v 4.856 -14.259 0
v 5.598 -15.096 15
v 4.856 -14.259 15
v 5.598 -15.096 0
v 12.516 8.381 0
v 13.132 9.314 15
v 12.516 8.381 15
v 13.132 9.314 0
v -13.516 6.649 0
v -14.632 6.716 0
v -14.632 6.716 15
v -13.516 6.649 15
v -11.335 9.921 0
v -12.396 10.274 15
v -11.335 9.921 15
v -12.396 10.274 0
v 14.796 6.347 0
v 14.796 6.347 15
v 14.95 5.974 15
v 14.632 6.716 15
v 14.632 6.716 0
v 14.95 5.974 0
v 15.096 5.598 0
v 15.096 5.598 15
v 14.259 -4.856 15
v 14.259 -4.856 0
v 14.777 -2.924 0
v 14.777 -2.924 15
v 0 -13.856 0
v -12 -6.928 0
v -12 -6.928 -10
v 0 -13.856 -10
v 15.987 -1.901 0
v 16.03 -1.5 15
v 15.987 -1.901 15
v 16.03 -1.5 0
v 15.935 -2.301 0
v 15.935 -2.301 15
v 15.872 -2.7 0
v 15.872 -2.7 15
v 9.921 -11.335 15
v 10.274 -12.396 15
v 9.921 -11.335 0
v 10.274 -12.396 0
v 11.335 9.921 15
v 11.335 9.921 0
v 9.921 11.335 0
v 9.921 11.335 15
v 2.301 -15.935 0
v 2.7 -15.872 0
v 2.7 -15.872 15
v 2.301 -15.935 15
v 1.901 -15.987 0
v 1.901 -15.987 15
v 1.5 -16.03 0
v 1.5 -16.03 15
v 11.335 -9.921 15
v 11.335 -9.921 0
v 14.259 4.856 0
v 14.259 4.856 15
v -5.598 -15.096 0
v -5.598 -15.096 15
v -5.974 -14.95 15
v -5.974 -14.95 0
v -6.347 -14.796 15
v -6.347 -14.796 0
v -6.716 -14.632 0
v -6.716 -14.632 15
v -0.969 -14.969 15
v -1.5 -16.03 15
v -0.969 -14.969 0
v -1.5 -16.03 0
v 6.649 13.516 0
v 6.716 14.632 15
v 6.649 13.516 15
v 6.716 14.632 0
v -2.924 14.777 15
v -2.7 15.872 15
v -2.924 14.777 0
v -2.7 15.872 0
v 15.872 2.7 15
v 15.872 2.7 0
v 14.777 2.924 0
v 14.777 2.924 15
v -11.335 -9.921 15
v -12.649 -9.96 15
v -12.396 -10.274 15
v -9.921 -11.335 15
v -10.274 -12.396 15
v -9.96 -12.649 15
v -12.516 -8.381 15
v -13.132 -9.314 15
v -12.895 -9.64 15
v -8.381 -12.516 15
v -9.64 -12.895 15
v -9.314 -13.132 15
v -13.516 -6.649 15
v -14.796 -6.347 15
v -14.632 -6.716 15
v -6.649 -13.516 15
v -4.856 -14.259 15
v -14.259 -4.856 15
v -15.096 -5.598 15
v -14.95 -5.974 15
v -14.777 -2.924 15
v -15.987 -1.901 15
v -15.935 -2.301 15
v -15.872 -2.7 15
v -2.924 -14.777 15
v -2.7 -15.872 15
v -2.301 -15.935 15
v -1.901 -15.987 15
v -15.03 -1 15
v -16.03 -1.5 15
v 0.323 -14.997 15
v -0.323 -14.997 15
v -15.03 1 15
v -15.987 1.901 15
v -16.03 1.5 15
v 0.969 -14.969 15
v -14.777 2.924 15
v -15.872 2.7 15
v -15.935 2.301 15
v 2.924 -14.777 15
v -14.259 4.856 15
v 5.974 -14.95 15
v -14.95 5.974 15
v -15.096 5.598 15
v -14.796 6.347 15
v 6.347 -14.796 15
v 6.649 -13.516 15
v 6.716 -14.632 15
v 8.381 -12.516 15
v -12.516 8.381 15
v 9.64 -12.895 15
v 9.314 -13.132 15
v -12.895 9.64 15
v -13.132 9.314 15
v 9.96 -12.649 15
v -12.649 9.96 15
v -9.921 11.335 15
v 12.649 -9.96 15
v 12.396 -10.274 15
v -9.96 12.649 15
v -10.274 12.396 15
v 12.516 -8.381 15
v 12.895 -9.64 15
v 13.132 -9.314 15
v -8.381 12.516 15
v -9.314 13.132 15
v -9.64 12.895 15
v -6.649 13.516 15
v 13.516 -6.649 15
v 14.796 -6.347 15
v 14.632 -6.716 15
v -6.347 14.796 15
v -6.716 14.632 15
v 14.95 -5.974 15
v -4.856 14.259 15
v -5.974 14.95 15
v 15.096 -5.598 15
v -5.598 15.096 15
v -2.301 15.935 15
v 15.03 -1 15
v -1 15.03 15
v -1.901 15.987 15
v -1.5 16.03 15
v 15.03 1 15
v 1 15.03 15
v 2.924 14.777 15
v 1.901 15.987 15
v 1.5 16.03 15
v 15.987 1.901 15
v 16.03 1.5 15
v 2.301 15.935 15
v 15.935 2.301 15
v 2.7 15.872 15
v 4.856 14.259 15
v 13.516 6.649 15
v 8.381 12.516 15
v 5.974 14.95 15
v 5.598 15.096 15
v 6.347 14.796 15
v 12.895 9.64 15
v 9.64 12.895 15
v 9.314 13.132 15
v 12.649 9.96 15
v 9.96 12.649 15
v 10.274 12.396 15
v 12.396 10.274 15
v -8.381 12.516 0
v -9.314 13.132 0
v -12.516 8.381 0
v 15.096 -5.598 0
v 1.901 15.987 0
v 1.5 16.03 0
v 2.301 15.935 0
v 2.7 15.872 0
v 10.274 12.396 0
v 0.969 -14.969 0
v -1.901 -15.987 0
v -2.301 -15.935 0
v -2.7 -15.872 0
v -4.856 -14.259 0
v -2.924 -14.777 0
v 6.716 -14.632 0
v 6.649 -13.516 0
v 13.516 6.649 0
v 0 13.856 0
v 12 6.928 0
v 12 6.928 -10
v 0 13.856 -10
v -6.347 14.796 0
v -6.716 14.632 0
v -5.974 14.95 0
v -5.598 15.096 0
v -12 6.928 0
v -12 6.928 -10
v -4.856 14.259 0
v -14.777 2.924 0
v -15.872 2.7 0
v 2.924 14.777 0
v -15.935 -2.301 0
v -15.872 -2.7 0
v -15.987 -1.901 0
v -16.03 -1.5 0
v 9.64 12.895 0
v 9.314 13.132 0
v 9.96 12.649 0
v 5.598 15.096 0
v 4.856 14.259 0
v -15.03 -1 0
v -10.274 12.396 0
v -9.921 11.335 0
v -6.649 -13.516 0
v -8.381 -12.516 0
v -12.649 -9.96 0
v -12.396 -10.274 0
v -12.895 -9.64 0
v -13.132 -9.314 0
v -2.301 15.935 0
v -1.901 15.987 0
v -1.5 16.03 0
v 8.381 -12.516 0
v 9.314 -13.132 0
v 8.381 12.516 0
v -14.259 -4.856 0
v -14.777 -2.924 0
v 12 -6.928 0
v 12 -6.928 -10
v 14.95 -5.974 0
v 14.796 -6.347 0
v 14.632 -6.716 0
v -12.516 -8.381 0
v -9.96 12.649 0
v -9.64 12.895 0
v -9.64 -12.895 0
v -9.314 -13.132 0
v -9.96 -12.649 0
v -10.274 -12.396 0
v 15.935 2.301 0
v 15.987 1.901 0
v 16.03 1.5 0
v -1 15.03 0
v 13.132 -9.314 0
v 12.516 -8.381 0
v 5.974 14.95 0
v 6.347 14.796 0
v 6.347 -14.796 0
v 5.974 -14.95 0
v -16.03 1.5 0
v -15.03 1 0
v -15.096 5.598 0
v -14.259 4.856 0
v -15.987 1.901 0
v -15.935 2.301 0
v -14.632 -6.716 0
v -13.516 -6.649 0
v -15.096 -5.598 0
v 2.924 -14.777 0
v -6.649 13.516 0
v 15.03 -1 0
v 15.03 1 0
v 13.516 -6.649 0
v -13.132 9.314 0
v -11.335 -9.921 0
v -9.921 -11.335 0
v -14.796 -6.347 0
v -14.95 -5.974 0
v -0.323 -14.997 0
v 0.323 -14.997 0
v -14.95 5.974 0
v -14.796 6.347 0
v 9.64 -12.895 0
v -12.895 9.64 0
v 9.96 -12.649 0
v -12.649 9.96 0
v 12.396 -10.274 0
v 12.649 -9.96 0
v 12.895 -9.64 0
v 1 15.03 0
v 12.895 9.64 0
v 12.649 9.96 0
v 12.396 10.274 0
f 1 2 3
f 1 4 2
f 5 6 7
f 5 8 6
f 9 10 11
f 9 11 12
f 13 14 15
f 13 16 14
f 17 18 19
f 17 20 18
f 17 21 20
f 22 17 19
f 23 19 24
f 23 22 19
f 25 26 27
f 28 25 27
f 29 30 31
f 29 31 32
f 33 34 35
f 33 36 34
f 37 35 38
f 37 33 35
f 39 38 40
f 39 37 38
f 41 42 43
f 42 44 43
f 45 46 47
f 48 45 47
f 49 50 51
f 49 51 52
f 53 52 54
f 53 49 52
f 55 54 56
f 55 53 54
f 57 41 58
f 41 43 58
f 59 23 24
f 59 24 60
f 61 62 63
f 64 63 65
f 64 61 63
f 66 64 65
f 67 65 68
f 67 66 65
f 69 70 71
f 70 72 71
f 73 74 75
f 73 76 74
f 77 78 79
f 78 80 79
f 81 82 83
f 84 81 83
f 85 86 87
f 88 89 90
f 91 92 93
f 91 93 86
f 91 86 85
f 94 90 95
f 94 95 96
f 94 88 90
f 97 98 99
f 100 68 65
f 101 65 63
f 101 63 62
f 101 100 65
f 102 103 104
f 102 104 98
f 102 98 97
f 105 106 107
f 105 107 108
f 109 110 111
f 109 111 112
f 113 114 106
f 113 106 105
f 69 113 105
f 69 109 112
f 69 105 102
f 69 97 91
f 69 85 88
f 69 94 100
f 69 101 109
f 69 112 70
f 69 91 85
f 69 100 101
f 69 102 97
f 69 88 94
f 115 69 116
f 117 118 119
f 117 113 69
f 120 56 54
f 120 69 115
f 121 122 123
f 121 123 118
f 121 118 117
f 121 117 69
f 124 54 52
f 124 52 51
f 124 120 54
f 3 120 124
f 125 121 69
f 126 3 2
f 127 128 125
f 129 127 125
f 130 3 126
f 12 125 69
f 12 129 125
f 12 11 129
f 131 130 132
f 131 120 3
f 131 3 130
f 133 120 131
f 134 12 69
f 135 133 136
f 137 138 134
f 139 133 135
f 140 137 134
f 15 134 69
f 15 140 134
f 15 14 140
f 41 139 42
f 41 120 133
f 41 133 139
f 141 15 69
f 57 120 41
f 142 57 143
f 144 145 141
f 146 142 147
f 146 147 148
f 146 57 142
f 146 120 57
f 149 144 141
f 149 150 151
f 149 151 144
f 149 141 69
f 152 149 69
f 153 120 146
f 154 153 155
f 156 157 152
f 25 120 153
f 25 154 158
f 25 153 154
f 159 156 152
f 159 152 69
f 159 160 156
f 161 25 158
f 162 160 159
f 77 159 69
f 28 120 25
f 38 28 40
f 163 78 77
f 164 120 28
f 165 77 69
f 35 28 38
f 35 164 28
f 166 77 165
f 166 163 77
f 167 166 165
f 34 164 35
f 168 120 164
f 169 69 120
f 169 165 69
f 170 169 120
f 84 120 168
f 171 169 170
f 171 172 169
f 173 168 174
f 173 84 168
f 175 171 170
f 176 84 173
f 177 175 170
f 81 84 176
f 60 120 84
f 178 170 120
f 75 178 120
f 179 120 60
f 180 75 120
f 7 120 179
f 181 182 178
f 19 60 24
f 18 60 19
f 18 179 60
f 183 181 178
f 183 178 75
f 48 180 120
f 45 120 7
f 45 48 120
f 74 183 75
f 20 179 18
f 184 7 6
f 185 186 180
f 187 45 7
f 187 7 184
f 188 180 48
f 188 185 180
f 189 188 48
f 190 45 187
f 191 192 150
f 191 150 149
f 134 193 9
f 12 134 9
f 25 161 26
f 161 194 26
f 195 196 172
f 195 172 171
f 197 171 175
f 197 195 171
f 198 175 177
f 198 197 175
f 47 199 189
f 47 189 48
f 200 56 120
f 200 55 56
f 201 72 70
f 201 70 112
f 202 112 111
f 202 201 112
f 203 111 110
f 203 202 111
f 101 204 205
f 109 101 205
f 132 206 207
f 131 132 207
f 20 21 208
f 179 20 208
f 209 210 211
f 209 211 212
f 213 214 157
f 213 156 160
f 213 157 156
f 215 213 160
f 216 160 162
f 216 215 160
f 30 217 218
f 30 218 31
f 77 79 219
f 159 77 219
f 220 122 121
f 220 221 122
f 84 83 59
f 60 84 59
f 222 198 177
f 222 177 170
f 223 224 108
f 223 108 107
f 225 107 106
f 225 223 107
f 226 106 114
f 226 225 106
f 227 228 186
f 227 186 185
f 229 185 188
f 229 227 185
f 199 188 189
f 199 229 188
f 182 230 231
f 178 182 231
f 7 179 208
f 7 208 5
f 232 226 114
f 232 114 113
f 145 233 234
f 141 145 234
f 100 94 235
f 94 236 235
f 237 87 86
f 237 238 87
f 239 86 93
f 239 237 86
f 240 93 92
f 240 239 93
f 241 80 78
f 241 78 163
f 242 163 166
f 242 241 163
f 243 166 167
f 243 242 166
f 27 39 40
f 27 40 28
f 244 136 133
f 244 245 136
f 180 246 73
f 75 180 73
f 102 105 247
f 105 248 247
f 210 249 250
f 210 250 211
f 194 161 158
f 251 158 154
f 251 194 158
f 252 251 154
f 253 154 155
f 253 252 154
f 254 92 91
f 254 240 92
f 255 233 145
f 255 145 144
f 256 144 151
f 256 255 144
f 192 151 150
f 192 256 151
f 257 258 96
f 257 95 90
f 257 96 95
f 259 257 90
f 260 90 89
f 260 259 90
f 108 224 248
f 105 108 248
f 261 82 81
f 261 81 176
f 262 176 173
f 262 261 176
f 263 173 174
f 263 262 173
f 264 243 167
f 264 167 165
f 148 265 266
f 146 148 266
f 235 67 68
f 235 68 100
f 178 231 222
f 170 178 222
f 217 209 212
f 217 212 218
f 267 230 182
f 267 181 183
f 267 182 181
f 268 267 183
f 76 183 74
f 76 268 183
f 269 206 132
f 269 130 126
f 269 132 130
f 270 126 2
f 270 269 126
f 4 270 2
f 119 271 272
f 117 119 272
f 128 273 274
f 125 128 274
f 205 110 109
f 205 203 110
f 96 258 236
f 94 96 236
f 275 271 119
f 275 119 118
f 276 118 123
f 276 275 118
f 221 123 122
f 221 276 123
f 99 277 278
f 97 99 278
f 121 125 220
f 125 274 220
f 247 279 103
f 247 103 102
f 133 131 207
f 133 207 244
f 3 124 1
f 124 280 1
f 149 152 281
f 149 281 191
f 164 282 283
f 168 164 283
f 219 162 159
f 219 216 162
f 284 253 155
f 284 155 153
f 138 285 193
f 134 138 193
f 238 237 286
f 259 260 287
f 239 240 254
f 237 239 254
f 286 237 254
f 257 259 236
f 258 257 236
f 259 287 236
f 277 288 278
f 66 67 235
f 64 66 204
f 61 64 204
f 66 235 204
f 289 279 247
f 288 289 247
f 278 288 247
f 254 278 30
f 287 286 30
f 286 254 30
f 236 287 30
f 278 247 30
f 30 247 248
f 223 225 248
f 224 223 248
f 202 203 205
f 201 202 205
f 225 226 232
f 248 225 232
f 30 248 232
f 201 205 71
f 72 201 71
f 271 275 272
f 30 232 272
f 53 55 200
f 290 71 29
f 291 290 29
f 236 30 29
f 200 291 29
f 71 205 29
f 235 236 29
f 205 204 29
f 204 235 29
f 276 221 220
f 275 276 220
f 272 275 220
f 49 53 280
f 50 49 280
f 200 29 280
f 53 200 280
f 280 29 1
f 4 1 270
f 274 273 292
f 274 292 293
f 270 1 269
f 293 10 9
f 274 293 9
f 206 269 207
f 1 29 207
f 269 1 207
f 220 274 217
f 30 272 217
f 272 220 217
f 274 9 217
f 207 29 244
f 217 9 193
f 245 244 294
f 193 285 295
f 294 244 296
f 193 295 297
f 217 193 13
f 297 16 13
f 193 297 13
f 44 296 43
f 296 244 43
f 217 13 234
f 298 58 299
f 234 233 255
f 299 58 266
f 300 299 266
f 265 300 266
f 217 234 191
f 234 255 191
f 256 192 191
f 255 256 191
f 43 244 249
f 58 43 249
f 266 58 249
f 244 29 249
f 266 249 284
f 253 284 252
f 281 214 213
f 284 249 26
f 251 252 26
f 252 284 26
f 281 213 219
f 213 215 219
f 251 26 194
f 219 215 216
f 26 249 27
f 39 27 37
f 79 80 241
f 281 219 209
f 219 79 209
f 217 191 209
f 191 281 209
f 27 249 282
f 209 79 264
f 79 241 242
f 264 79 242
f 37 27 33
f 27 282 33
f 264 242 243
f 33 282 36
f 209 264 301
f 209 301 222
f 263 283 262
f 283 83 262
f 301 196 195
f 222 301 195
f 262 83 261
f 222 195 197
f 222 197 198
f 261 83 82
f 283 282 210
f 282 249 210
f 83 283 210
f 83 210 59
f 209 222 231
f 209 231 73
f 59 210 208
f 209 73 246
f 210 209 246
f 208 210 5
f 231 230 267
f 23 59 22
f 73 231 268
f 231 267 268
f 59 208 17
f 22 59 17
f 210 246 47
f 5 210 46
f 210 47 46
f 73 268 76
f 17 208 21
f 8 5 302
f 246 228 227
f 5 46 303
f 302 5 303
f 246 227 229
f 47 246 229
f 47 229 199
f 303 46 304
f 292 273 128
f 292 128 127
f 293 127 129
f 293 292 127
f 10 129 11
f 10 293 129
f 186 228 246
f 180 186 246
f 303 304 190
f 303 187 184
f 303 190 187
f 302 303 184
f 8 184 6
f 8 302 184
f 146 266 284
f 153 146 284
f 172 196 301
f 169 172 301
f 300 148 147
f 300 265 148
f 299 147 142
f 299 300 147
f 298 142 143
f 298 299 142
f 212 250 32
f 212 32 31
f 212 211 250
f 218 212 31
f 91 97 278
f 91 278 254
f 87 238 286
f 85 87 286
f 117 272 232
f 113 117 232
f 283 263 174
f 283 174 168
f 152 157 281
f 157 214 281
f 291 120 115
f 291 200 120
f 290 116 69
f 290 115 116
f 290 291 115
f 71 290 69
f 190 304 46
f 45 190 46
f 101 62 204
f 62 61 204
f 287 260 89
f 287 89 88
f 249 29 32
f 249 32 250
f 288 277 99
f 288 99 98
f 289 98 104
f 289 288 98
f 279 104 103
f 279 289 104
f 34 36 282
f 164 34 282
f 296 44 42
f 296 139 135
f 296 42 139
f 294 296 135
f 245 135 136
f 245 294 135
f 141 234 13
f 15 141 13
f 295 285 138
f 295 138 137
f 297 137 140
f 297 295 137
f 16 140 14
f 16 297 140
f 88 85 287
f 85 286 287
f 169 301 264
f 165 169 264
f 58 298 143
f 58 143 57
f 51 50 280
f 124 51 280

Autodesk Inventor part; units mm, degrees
ref_plane "YZ Plane" through (0, 0, 0) normal (1, 0, 0) x (0, 1, 0)
ref_plane "XZ Plane" through (0, 0, 0) normal (0, 1, 0) x (-1, 0, 0)
ref_plane "XY Plane" through (0, 0, 0) normal (0, 0, 1) x (1, 0, 0)
sketch "Sketch1" plane through (0, 0, 0) normal (0, 0, 1) x (1, 0, 0)
  circle A0 centre (0, 0) radius 17.25
  circle A1 centre (0, 0) radius 16.1
  circle A2 centre (0, 0) radius 15
  line L0 (-1, -15.03) -> (1, -15.03)
  line L1 (-1.5, -16.03) -> (1.5, -16.03)
  line L2 (1.5, -16.03) -> (1, -15.03)
  line L3 (-1.5, -16.03) -> (-1, -15.03)
  line L4 (-1, -15.03) -> (-0.9693, -14.9686)
  line L5 (1, -15.03) -> (0.9693, -14.9686)
  line L6 (2.9241, -14.7767) -> (4.856, -14.259)
  line L7 (2.7, -15.872) -> (2.9241, -14.7767)
  line L8 (2.9241, -14.7767) -> (2.9379, -14.7095)
  line L9 (5.5978, -15.0955) -> (4.856, -14.259)
  line L10 (4.856, -14.259) -> (4.8105, -14.2077)
  line L11 (6.649, -13.5163) -> (8.381, -12.5163)
  line L12 (6.7159, -14.6324) -> (6.649, -13.5163)
  line L13 (6.649, -13.5163) -> (6.6449, -13.4479)
  line L14 (9.314, -13.1324) -> (8.381, -12.5163)
  line L15 (8.381, -12.5163) -> (8.3238, -12.4786)
  line L16 (9.9207, -11.3349) -> (11.3349, -9.9207)
  line L17 (10.2742, -12.3956) -> (9.9207, -11.3349)
  line L18 (9.9207, -11.3349) -> (9.899, -11.2699)
  line L19 (12.3956, -10.2742) -> (11.3349, -9.9207)
  line L20 (11.3349, -9.9207) -> (11.2699, -9.899)
  line L21 (12.5163, -8.381) -> (13.5163, -6.649)
  line L22 (13.1324, -9.314) -> (12.5163, -8.381)
  line L23 (12.5163, -8.381) -> (12.4786, -8.3238)
  line L24 (14.6324, -6.7159) -> (13.5163, -6.649)
  line L25 (13.5163, -6.649) -> (13.4479, -6.6449)
  line L26 (14.259, -4.856) -> (14.7767, -2.9241)
  line L27 (15.0955, -5.5978) -> (14.259, -4.856)
  line L28 (14.259, -4.856) -> (14.2077, -4.8105)
  line L29 (15.872, -2.7) -> (14.7767, -2.9241)
  line L30 (14.7767, -2.9241) -> (14.7095, -2.9379)
  line L31 (15.03, -1) -> (15.03, 1)
  line L32 (16.03, -1.5) -> (15.03, -1)
  line L33 (15.03, -1) -> (14.9686, -0.9693)
  line L34 (16.03, 1.5) -> (15.03, 1)
  line L35 (15.03, 1) -> (14.9686, 0.9693)
  line L36 (14.7767, 2.9241) -> (14.259, 4.856)
  line L37 (15.872, 2.7) -> (14.7767, 2.9241)
  line L38 (14.7767, 2.9241) -> (14.7095, 2.9379)
  line L39 (15.0955, 5.5978) -> (14.259, 4.856)
  line L40 (14.259, 4.856) -> (14.2077, 4.8105)
  line L41 (13.5163, 6.649) -> (12.5163, 8.381)
  line L42 (14.6324, 6.7159) -> (13.5163, 6.649)
  line L43 (13.5163, 6.649) -> (13.4479, 6.6449)
  line L44 (13.1324, 9.314) -> (12.5163, 8.381)
  line L45 (12.5163, 8.381) -> (12.4786, 8.3238)
  line L46 (11.3349, 9.9207) -> (9.9207, 11.3349)
  line L47 (12.3956, 10.2742) -> (11.3349, 9.9207)
  line L48 (11.3349, 9.9207) -> (11.2699, 9.899)
  line L49 (10.2742, 12.3956) -> (9.9207, 11.3349)
  line L50 (9.9207, 11.3349) -> (9.899, 11.2699)
  line L51 (8.381, 12.5163) -> (6.649, 13.5163)
  line L52 (9.314, 13.1324) -> (8.381, 12.5163)
  line L53 (8.381, 12.5163) -> (8.3238, 12.4786)
  line L54 (6.7159, 14.6324) -> (6.649, 13.5163)
  line L55 (6.649, 13.5163) -> (6.6449, 13.4479)
  line L56 (4.856, 14.259) -> (2.9241, 14.7767)
  line L57 (5.5978, 15.0955) -> (4.856, 14.259)
  line L58 (4.856, 14.259) -> (4.8105, 14.2077)
  line L59 (2.7, 15.872) -> (2.9241, 14.7767)
  line L60 (2.9241, 14.7767) -> (2.9379, 14.7095)
  line L61 (1, 15.03) -> (-1, 15.03)
  line L62 (1.5, 16.03) -> (1, 15.03)
  line L63 (1, 15.03) -> (0.9693, 14.9686)
  line L64 (-1.5, 16.03) -> (-1, 15.03)
  line L65 (-1, 15.03) -> (-0.9693, 14.9686)
  line L66 (-2.9241, 14.7767) -> (-4.856, 14.259)
  line L67 (-2.7, 15.872) -> (-2.9241, 14.7767)
  line L68 (-2.9241, 14.7767) -> (-2.9379, 14.7095)
  line L69 (-5.5978, 15.0955) -> (-4.856, 14.259)
  line L70 (-4.856, 14.259) -> (-4.8105, 14.2077)
  line L71 (-6.649, 13.5163) -> (-8.381, 12.5163)
  line L72 (-6.7159, 14.6324) -> (-6.649, 13.5163)
  line L73 (-6.649, 13.5163) -> (-6.6449, 13.4479)
  line L74 (-9.314, 13.1324) -> (-8.381, 12.5163)
  line L75 (-8.381, 12.5163) -> (-8.3238, 12.4786)
  line L76 (-9.9207, 11.3349) -> (-11.3349, 9.9207)
  line L77 (-10.2742, 12.3956) -> (-9.9207, 11.3349)
  line L78 (-9.9207, 11.3349) -> (-9.899, 11.2699)
  line L79 (-12.3956, 10.2742) -> (-11.3349, 9.9207)
  line L80 (-11.3349, 9.9207) -> (-11.2699, 9.899)
  line L81 (-12.5163, 8.381) -> (-13.5163, 6.649)
  line L82 (-13.1324, 9.314) -> (-12.5163, 8.381)
  line L83 (-12.5163, 8.381) -> (-12.4786, 8.3238)
  line L84 (-14.6324, 6.7159) -> (-13.5163, 6.649)
  line L85 (-13.5163, 6.649) -> (-13.4479, 6.6449)
  line L86 (-14.259, 4.856) -> (-14.7767, 2.9241)
  line L87 (-15.0955, 5.5978) -> (-14.259, 4.856)
  line L88 (-14.259, 4.856) -> (-14.2077, 4.8105)
  line L89 (-15.872, 2.7) -> (-14.7767, 2.9241)
  line L90 (-14.7767, 2.9241) -> (-14.7095, 2.9379)
  line L91 (-15.03, 1) -> (-15.03, -1)
  line L92 (-16.03, 1.5) -> (-15.03, 1)
  line L93 (-15.03, 1) -> (-14.9686, 0.9693)
  line L94 (-16.03, -1.5) -> (-15.03, -1)
  line L95 (-15.03, -1) -> (-14.9686, -0.9693)
  line L96 (-14.7767, -2.9241) -> (-14.259, -4.856)
  line L97 (-15.872, -2.7) -> (-14.7767, -2.9241)
  line L98 (-14.7767, -2.9241) -> (-14.7095, -2.9379)
  line L99 (-15.0955, -5.5978) -> (-14.259, -4.856)
  line L100 (-14.259, -4.856) -> (-14.2077, -4.8105)
  line L101 (-13.5163, -6.649) -> (-12.5163, -8.381)
  line L102 (-14.6324, -6.7159) -> (-13.5163, -6.649)
  line L103 (-13.5163, -6.649) -> (-13.4479, -6.6449)
  line L104 (-13.1324, -9.314) -> (-12.5163, -8.381)
  line L105 (-12.5163, -8.381) -> (-12.4786, -8.3238)
  line L106 (-11.3349, -9.9207) -> (-9.9207, -11.3349)
  line L107 (-12.3956, -10.2742) -> (-11.3349, -9.9207)
  line L108 (-11.3349, -9.9207) -> (-11.2699, -9.899)
  line L109 (-10.2742, -12.3956) -> (-9.9207, -11.3349)
  line L110 (-9.9207, -11.3349) -> (-9.899, -11.2699)
  line L111 (-8.381, -12.5163) -> (-6.649, -13.5163)
  line L112 (-9.314, -13.1324) -> (-8.381, -12.5163)
  line L113 (-8.381, -12.5163) -> (-8.3238, -12.4786)
  line L114 (-6.7159, -14.6324) -> (-6.649, -13.5163)
  line L115 (-6.649, -13.5163) -> (-6.6449, -13.4479)
  line L116 (-4.856, -14.259) -> (-2.9241, -14.7767)
  line L117 (-5.5978, -15.0955) -> (-4.856, -14.259)
  line L118 (-4.856, -14.259) -> (-4.8105, -14.2077)
  line L119 (-2.7, -15.872) -> (-2.9241, -14.7767)
  line L120 (-2.9241, -14.7767) -> (-2.9379, -14.7095)
  point P0 (0, -16.03)
  point P1 (0, -15.03)
  point P2 (1.5, -16.03)
  point P3 (1.5, -16.03)
  point P4 (3.89, -14.5178)
  point P5 (7.515, -13.0163)
  point P6 (10.6278, -10.6278)
  point P7 (13.0163, -7.515)
  point P8 (14.5178, -3.89)
  point P9 (15.03, 0)
  point P10 (14.5178, 3.89)
  point P11 (13.0163, 7.515)
  point P12 (10.6278, 10.6278)
  point P13 (7.515, 13.0163)
  point P14 (3.89, 14.5178)
  point P15 (0, 15.03)
  point P16 (-3.89, 14.5178)
  point P17 (-7.515, 13.0163)
  point P18 (-10.6278, 10.6278)
  point P19 (-13.0163, 7.515)
  point P20 (-14.5178, 3.89)
  point P21 (-15.03, 0)
  point P22 (-14.5178, -3.89)
  point P23 (-13.0163, -7.515)
  point P24 (-10.6278, -10.6278)
  point P25 (-7.515, -13.0163)
  point P26 (-3.89, -14.5178)
  point P27 (2.7, -15.872)
  point P28 (5.5978, -15.0955)
  point P29 (6.7159, -14.6324)
  point P30 (9.314, -13.1324)
  point P31 (10.2742, -12.3956)
  point P32 (12.3956, -10.2742)
  point P33 (14.6324, -6.7159)
  point P34 (15.872, -2.7)
  point P35 (16.03, -1.5)
  point P36 (16.03, 1.5)
  point P37 (15.872, 2.7)
  point P38 (15.0955, 5.5978)
  point P39 (14.6324, 6.7159)
  point P40 (13.1324, 9.314)
  point P41 (12.3956, 10.2742)
  point P42 (10.2742, 12.3956)
  point P43 (6.7159, 14.6324)
  point P44 (2.7, 15.872)
  point P45 (1.5, 16.03)
  point P46 (-1.5, 16.03)
  point P47 (-5.5978, 15.0955)
  point P48 (-6.7159, 14.6324)
  point P49 (-10.2742, 12.3956)
  point P50 (-12.3956, 10.2742)
  point P51 (-14.6324, 6.7159)
  point P52 (-15.0955, 5.5978)
  point P53 (-15.872, 2.7)
  point P54 (-16.03, -1.5)
  point P55 (-14.6324, -6.7159)
  point P56 (-12.3956, -10.2742)
  point P57 (-10.2742, -12.3956)
  point P58 (-9.314, -13.1324)
  point P59 (-6.7159, -14.6324)
  point P60 (-5.5978, -15.0955)
  point P61 (-2.7, -15.872)
  dimension "d1" = 32.2
  dimension "d0" = 34.5
  dimension "d2" = 30
  dimension "d3" = 2
  dimension "d4" = 3
  dimension "d5" = 1
  dimension "d20" = 360
extrude "Extrusion1" add sketch "Sketch1" along normal blind 15 contours L34 L35 A2 L38 L37 A1 | A1 L29 L30 A2 L33 L32 | L31 L33 A2 L35 | L39 L40 A2 L43 L42 A1 | L38 A2 L40 L36 | A2 | A1 L24 L25 A2 L28 L27 | L26 L28 A2 L30 | L44 L45 A2 L48 L47 A1 | L43 A2 L45 L41 | A1 L19 L20 A2 L23 L22 | L21 L23 A2 L25 | L49 L50 A2 L53 L52 A1 | L48 A2 L50 L46 | A1 L14 L15 A2 L18 L17 | L16 L18 A2 L20 | L54 L55 A2 L58 L57 A1 | L53 A2 L55 L51 | A1 L9 L10 A2 L13 L12 | L11 L13 A2 L15 | L59 L60 A2 L63 L62 A1 | L58 A2 L60 L56 | A1 L2 L5 A2 L8 L7 | L6 L8 A2 L10 | L64 L65 A2 L68 L67 A1 | L63 A2 L65 L61 | A1 L119 L120 A2 L4 L3 | L69 L70 A2 L73 L72 A1 | L68 A2 L70 L66 | A1 L114 L115 A2 L118 L117 | L116 L118 A2 L120 | L74 L75 A2 L78 L77 A1 | L73 A2 L75 L71 | A1 L109 L110 A2 L113 L112 | L111 L113 A2 L115 | L79 L80 A2 L83 L82 A1 | L78 A2 L80 L76 | A1 L104 L105 A2 L108 L107 | L106 L108 A2 L110 | L84 L85 A2 L88 L87 A1 | L83 A2 L85 L81 | A1 L99 L100 A2 L103 L102 | L101 L103 A2 L105 | L89 L90 A2 L93 L92 A1 | L88 A2 L90 L86 | A1 L94 L95 A2 L98 L97 | L96 L98 A2 L100 | L93 A2 L95 L91
sketch "Sketch2" plane through (0, 0, 0) normal (0, 0, -1) x (-1, 0, 0)
  line L0 (12, 6.9282) -> (12, -6.9282)
  line L1 (12, -6.9282) -> (0, -13.8564)
  line L2 (0, -13.8564) -> (-12, -6.9282)
  line L3 (-12, -6.9282) -> (-12, 6.9282)
  line L4 (-12, 6.9282) -> (0, 13.8564)
  line L5 (0, 13.8564) -> (12, 6.9282)
  point P0 (0, 0)
  point P1 (0, 0)
  dimension "d12" = 24
extrude "Extrusion2" add sketch "Sketch2" along normal blind 10
sketch "Sketch3" plane through (0, 0, -10) normal (0, 0, -1) x (-1, 0, 0)
  circle A0 centre (0, 0) radius 7.5
  dimension "d15" = 15
extrude "Extrusion3" [suppressed]
sketch "Sketch4" plane through (0, 0, 0) normal (1, 0, 0) x (0, 1, 0)
  line L0 (20.1089, -13.3141) -> (-23.1689, -13.3141)
  line L1 (-23.1689, -13.3141) -> (-23.1689, 5.9253)
  line L2 (-23.1689, 5.9253) -> (20.1089, 5.9253)
  line L3 (20.1089, 5.9253) -> (20.1089, -13.3141)
  point P0 (0, 0)
extrude "Extrusion4" [suppressed]
properties part number "Nastavek Millard freewheel tool izmerjen trapze"
